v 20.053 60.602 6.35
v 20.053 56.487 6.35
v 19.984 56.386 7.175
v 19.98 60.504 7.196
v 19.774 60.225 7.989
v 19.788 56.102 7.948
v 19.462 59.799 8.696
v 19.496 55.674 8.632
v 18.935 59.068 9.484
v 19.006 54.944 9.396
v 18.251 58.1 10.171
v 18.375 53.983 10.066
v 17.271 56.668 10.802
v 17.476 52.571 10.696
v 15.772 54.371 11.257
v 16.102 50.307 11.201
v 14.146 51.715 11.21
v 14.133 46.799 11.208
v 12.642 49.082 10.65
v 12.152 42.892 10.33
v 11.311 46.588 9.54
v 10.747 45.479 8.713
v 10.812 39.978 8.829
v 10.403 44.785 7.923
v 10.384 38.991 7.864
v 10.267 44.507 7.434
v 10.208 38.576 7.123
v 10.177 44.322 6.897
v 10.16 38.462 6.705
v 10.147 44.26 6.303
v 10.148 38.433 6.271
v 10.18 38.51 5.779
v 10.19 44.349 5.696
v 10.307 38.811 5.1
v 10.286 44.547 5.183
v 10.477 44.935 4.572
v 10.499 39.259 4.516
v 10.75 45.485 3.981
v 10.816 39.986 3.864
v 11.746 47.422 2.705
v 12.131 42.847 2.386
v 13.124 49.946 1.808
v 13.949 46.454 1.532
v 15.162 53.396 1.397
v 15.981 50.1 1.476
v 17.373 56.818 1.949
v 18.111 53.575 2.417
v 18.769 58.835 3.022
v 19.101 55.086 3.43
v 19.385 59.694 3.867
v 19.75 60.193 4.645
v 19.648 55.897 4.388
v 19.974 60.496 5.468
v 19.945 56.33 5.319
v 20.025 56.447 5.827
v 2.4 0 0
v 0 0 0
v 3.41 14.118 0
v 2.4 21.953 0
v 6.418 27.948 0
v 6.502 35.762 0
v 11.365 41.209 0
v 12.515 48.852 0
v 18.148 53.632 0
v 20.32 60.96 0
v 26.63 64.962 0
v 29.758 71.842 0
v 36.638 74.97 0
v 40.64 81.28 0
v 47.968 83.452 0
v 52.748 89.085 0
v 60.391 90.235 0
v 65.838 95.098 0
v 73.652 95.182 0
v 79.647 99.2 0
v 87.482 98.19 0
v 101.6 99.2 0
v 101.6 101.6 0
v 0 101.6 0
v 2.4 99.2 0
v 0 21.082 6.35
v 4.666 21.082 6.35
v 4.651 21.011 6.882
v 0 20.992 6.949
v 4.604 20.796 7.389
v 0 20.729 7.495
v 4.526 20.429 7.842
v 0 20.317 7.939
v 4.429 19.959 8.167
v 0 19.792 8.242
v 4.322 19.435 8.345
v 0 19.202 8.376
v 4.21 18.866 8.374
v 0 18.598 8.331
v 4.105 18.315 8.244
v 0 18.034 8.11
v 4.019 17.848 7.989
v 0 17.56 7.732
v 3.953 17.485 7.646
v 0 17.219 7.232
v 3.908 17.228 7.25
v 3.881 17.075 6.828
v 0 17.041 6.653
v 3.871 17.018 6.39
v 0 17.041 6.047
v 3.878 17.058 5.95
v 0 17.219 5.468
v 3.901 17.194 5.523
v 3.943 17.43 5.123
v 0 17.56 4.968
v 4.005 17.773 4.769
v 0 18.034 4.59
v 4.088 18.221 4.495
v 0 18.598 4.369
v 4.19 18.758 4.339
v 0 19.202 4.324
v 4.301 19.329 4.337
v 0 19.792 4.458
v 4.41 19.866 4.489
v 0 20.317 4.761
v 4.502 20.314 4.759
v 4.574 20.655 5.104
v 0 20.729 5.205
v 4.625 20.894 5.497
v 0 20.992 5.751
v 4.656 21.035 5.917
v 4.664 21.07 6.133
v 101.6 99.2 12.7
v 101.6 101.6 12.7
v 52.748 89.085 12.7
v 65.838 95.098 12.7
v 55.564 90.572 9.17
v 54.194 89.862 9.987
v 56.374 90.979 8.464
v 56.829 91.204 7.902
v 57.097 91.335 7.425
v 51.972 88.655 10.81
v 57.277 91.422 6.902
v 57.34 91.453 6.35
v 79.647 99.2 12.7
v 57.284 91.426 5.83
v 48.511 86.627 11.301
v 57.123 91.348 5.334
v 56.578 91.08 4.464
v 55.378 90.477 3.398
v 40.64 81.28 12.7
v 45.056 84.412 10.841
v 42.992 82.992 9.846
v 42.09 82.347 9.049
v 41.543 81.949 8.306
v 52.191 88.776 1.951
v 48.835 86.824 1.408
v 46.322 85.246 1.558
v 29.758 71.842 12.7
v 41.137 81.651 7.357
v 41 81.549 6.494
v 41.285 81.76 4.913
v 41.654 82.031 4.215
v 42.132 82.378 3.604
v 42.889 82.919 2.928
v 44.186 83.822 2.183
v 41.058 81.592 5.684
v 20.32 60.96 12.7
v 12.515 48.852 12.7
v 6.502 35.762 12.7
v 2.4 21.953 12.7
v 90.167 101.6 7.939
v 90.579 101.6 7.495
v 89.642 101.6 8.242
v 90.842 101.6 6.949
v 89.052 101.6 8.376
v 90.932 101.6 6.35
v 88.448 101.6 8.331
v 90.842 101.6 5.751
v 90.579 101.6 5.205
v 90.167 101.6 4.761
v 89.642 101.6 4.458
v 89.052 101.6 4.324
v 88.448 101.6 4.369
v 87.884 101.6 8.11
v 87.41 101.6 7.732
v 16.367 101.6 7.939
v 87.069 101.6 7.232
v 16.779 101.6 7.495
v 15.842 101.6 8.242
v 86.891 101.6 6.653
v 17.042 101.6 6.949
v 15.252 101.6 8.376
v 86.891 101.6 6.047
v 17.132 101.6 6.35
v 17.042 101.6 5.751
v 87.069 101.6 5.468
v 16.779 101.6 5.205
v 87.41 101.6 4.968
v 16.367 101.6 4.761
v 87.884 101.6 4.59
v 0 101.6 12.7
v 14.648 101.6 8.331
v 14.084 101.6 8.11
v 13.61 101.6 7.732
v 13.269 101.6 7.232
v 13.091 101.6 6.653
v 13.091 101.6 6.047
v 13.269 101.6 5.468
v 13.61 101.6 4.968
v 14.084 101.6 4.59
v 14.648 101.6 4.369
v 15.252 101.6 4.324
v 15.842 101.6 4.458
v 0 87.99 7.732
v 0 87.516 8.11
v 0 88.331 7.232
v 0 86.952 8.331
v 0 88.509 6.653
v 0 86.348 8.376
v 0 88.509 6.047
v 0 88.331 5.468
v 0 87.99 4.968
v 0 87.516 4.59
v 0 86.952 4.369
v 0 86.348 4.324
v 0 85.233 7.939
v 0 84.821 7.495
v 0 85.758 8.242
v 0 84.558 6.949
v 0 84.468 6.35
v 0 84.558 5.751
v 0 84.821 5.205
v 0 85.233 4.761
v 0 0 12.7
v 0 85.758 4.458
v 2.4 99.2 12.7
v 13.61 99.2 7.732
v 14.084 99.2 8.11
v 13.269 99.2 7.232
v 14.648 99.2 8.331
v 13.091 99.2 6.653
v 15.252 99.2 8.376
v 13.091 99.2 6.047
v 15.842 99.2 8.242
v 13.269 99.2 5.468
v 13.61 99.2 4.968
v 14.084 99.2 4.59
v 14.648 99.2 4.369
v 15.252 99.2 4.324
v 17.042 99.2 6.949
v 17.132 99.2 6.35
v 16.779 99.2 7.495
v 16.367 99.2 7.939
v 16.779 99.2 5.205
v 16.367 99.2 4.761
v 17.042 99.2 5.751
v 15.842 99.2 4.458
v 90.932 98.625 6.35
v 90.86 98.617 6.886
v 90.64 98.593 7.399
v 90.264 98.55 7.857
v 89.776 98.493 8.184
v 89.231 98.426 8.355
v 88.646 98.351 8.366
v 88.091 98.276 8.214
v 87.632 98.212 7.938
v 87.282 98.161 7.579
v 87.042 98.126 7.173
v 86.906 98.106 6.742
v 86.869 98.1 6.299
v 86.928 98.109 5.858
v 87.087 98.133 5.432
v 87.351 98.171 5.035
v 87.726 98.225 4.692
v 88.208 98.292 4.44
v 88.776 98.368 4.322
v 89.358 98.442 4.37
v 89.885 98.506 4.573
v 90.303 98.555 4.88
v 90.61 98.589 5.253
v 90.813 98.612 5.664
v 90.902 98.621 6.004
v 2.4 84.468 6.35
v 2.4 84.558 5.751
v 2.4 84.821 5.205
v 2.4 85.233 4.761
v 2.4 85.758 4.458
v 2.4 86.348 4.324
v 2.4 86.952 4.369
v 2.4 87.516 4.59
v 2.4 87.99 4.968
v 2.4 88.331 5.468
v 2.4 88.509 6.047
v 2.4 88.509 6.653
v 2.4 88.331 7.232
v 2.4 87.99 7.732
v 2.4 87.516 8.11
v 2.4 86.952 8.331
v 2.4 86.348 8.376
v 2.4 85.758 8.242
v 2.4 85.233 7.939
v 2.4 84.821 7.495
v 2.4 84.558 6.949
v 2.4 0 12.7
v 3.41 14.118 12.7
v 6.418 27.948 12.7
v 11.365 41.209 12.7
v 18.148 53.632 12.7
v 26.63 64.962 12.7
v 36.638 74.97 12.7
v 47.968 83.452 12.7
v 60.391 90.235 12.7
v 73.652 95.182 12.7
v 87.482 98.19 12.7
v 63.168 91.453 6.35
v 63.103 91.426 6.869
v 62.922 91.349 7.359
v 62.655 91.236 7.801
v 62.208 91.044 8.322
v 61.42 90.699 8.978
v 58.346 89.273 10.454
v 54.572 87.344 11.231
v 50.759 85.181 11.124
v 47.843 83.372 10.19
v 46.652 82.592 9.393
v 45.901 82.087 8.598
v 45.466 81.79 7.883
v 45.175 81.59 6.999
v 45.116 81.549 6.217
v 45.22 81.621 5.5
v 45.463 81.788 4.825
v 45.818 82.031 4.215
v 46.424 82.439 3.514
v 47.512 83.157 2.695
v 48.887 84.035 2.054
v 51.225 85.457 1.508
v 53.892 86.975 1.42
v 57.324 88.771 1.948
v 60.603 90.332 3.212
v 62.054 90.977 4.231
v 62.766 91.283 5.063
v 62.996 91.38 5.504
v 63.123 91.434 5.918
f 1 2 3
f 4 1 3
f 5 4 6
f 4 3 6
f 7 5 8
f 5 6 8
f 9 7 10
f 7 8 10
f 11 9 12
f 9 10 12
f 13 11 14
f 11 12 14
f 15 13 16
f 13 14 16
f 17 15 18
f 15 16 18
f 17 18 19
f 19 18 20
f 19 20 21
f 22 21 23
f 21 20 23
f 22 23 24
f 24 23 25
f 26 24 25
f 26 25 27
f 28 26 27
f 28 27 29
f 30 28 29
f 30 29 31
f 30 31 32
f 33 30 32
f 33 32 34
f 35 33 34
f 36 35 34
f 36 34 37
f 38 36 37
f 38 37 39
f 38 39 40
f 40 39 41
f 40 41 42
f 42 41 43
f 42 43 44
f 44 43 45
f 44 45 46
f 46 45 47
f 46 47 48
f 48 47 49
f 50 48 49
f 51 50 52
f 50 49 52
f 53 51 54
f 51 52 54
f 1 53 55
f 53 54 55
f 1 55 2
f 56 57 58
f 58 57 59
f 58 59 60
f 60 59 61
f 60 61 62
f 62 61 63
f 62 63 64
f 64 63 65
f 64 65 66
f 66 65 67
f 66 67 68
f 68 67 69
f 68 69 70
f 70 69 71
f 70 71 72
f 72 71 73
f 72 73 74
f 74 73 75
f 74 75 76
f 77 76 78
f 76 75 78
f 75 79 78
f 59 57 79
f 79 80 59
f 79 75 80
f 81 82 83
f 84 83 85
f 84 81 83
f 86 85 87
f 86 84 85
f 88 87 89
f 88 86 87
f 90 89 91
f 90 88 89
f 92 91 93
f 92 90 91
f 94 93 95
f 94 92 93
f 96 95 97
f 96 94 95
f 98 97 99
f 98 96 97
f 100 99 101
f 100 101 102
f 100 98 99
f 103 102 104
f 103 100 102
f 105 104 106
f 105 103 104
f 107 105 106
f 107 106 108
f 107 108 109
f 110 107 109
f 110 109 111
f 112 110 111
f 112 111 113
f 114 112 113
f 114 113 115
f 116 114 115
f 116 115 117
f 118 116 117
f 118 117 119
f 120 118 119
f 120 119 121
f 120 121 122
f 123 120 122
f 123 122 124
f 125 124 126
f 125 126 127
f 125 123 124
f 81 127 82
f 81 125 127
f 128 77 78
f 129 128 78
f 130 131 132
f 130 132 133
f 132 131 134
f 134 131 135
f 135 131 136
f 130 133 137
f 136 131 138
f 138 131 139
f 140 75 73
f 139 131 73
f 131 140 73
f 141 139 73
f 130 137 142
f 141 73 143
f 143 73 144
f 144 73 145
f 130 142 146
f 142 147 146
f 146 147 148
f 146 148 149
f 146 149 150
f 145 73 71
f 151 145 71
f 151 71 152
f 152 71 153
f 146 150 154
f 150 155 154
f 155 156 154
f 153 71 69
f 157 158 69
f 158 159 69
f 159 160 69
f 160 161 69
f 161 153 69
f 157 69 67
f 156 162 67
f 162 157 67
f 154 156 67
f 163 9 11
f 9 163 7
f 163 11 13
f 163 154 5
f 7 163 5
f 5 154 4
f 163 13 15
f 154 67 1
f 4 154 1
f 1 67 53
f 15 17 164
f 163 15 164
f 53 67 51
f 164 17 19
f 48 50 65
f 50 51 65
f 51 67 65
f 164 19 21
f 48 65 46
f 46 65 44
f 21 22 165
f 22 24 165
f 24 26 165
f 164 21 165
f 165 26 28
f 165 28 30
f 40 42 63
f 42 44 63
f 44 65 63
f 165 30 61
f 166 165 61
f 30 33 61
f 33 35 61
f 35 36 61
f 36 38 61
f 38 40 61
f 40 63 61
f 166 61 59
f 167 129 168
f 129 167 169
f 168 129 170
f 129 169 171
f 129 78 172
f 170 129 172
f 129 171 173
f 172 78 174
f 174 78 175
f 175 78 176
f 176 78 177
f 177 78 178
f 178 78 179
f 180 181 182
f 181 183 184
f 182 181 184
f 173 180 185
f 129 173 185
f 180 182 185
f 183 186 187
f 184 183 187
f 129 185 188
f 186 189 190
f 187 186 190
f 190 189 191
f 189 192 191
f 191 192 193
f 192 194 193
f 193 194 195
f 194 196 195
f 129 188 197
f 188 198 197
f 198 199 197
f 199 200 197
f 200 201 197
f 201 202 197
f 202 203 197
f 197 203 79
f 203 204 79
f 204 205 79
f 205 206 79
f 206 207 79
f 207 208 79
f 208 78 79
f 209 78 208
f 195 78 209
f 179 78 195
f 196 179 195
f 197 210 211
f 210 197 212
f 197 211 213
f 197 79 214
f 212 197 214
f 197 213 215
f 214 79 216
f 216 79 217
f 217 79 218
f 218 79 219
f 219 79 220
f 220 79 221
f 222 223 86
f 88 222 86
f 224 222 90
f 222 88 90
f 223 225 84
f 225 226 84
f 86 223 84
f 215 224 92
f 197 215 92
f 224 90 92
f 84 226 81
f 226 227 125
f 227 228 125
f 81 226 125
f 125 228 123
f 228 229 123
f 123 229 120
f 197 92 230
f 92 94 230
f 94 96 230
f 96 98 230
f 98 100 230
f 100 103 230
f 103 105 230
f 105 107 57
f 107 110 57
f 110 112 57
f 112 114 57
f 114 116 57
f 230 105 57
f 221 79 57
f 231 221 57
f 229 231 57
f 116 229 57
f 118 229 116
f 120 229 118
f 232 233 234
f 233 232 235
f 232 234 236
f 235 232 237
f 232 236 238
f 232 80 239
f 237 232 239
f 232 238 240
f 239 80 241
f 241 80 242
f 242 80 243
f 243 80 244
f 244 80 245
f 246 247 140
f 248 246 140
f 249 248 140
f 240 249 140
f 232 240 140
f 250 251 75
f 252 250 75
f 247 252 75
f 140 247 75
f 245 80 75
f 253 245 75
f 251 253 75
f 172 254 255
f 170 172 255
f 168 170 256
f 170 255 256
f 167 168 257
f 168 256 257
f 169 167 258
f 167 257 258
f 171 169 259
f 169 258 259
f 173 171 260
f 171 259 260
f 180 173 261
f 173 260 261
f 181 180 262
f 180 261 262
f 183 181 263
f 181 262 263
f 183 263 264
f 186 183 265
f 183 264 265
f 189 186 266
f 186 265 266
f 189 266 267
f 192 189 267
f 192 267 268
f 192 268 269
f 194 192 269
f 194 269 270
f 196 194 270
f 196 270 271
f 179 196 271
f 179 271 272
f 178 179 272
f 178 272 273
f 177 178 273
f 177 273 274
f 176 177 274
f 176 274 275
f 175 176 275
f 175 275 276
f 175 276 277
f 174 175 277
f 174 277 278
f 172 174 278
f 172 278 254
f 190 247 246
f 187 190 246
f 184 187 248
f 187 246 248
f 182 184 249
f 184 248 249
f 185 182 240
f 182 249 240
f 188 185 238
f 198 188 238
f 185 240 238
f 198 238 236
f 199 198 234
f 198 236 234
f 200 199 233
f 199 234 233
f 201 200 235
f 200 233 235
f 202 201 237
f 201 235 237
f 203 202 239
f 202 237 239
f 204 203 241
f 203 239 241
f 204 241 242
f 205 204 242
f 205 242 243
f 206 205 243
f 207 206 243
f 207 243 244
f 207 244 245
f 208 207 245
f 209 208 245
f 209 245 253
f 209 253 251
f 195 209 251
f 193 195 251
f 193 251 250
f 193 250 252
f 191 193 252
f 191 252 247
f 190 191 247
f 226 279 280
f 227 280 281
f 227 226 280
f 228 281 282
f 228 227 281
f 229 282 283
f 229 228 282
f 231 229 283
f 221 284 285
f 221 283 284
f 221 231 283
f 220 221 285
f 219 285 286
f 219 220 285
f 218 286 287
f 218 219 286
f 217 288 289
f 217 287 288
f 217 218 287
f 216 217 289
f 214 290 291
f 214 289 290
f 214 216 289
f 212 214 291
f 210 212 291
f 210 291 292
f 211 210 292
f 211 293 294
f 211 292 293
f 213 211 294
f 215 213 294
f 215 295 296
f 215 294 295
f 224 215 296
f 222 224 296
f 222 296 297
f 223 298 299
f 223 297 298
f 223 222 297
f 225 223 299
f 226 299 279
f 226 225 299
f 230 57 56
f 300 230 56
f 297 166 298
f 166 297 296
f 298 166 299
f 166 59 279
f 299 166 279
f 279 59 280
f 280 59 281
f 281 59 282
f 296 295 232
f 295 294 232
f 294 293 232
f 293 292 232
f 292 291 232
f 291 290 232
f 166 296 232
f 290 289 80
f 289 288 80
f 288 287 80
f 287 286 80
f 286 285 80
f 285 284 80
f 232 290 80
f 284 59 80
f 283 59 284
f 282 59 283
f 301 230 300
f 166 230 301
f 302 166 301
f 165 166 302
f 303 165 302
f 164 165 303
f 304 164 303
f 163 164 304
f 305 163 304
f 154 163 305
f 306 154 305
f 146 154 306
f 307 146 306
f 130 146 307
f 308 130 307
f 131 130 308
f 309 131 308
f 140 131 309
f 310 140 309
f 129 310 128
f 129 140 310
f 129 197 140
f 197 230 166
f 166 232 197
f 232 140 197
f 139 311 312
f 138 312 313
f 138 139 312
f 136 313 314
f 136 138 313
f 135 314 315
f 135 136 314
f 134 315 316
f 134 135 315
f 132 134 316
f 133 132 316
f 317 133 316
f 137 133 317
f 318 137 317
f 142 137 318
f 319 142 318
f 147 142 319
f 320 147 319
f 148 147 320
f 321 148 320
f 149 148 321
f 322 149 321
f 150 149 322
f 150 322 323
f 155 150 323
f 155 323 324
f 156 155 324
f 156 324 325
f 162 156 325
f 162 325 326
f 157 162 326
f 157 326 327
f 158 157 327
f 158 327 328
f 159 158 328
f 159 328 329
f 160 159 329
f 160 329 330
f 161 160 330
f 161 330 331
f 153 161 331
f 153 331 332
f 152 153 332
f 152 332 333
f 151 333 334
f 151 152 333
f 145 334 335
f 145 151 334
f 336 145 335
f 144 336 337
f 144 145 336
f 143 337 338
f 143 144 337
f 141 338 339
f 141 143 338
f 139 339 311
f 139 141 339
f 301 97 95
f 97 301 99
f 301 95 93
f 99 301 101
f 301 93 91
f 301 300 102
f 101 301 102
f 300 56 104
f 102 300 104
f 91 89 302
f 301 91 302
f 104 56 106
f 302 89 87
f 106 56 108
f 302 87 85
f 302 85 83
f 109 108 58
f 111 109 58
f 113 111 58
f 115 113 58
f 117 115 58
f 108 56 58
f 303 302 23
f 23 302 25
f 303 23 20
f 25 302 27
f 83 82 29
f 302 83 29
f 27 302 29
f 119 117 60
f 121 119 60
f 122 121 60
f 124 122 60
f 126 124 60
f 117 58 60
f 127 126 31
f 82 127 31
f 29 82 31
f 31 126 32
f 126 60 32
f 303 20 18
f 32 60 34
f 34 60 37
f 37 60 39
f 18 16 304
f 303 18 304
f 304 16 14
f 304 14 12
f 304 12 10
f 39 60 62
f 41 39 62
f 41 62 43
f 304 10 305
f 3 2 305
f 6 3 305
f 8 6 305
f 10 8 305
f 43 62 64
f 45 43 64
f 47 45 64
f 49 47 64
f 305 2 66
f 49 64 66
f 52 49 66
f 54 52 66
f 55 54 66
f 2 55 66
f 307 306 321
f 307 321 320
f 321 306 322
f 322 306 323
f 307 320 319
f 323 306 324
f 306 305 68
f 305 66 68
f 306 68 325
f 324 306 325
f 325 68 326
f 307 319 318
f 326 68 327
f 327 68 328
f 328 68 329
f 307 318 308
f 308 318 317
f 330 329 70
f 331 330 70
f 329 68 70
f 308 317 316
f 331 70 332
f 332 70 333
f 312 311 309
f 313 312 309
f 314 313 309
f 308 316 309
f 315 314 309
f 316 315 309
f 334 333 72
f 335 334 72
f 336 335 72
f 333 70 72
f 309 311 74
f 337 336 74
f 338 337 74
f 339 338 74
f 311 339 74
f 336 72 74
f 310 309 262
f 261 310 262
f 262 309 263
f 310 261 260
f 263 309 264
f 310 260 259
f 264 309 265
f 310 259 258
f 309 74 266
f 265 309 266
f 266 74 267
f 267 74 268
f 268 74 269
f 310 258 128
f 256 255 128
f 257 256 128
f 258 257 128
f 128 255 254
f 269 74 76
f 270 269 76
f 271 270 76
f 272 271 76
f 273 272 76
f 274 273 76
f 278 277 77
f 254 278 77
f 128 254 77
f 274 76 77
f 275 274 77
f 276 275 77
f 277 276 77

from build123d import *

# Parameters (mm, degrees)
F1_DEPTH = 12.7
F2_R     = 2.032
F3_DEPTH = 101.601
F4_R     = 2.032
F5_DEPTH = 101.601
F6_R     = 4.953
F7_DEPTH = 63.246
F9_START = 18.542
F8_R     = 4.953
F9_DEPTH = 49.53


with BuildPart() as f1:
    # F0 (on Top) → F1 (new body)
    with BuildSketch(Plane.XY):
        with BuildLine():
            Line((101.6, 99.2), (101.6, 101.6))
            Line((101.6, 101.6), (0, 101.6))
            Line((0, 101.6), (0, 0))
            Line((0, 0), (2.4, 0))
            ThreePointArc((2.4, 0), (31.4550073063, 70.1449926937), (101.6, 99.2))
        make_face()
        with BuildLine():
            Line((2.4, 99.2), (79.6473236256, 99.2))
            ThreePointArc((79.6473236256, 99.2), (29.7579510314, 71.8420489686), (2.4, 21.9526763744))
            Line((2.4, 21.9526763744), (2.4, 99.2))
        make_face(mode=Mode.SUBTRACT)
    extrude(amount=F1_DEPTH)

    # F2 (on Right) → F3 (cut, through all)
    with BuildSketch(Plane.YZ):
        with Locations((19.05, 6.35)):
            Circle(F2_R)
        with BuildLine():
            ThreePointArc((88.532, 6.35), (86.5, 8.382), (84.468, 6.35))
            ThreePointArc((84.468, 6.35), (86.5, 4.318), (88.532, 6.35))
        make_face()
    extrude(amount=F3_DEPTH, mode=Mode.SUBTRACT)

    # F4 (on Front) → F5 (cut, through all)
    with BuildSketch(Plane.XZ):
        with Locations((15.1, 6.35)):
            Circle(F4_R)
        with Locations((88.9, 6.35)):
            Circle(F4_R)
    extrude(amount=-F5_DEPTH, mode=Mode.SUBTRACT)

    # F6 (on Front) → F7 (cut)
    with BuildSketch(Plane.XZ):
        with Locations((15.1, 6.35)):
            Circle(F6_R)
    extrude(amount=-F7_DEPTH, mode=Mode.SUBTRACT)

    # F8 (on Right) → F9 (cut)
    with BuildSketch(Plane.YZ.offset(F9_START)):
        with Locations((86.5, 6.35)):
            Circle(F8_R)
    extrude(amount=F9_DEPTH, mode=Mode.SUBTRACT)


solid = f1.part
